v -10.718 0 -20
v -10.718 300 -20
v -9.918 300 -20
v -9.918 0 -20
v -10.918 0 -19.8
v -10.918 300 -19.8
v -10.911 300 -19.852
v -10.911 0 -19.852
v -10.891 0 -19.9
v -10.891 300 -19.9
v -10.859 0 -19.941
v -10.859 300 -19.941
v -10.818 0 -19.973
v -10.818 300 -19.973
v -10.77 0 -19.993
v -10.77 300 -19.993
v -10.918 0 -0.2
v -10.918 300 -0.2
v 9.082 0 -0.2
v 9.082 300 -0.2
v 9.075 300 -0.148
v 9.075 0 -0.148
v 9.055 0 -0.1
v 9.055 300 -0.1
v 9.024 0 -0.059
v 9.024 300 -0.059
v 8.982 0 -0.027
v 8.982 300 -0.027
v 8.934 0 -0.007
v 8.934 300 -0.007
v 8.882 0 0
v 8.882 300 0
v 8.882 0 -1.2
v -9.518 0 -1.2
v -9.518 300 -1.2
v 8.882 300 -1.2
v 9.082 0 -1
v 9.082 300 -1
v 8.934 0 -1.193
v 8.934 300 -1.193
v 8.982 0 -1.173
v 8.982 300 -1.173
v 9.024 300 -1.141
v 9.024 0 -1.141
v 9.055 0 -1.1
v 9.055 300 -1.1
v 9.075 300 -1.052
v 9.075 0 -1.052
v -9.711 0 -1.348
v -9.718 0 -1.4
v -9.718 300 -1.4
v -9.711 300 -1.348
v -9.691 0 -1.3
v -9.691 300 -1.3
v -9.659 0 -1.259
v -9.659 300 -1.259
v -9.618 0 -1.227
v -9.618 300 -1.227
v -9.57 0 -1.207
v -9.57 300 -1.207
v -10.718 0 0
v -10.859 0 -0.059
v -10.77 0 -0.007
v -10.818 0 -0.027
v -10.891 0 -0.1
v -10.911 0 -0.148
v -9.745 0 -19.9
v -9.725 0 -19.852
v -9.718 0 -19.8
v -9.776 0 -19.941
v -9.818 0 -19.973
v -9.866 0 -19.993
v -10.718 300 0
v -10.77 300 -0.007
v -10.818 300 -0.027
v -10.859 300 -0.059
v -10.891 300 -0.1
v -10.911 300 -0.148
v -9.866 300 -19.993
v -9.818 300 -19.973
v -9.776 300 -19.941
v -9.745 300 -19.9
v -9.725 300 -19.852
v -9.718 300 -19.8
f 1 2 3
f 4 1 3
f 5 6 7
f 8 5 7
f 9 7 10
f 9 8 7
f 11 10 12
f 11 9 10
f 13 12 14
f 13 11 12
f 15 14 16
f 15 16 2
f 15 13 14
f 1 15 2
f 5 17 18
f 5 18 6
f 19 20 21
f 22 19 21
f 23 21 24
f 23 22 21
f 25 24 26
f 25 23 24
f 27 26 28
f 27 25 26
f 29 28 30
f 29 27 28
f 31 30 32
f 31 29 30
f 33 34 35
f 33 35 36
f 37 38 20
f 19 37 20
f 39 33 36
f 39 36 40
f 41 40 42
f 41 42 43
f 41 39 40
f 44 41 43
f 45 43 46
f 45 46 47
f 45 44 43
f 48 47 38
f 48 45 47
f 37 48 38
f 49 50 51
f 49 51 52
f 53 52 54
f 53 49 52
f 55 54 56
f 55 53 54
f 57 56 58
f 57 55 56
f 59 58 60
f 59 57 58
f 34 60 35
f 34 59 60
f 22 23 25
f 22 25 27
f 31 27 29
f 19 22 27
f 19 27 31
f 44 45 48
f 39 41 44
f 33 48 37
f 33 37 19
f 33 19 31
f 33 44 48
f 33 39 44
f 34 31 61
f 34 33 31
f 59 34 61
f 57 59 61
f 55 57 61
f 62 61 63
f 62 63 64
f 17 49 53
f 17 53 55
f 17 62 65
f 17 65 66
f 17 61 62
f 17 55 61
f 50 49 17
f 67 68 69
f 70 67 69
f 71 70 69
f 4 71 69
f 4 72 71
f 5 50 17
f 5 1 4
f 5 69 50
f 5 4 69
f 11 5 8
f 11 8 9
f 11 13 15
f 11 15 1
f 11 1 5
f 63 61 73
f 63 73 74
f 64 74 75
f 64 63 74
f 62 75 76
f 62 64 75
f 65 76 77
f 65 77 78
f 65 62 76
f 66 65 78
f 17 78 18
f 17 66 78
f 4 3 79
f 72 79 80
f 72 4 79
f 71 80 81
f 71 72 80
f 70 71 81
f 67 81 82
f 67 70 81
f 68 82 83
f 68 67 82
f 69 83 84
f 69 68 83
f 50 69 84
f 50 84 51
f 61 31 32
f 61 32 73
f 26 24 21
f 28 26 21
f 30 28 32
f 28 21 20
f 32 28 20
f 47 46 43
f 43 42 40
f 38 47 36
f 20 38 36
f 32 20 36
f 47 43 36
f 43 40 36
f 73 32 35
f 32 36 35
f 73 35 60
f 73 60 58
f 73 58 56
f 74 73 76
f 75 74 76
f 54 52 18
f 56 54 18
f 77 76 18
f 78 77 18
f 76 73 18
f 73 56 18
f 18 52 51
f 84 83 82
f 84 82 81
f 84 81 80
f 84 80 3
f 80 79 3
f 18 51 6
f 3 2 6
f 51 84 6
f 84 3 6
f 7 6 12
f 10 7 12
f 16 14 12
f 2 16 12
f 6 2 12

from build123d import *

# Parameters (mm, degrees)
EXTRUDE_1_DEPTH = 300


with BuildPart() as part:
    # уголок-20х20 → Бобышка-Вытянуть1 (new body)
    with BuildSketch(Plane(origin=(0, 0, 0), x_dir=(1, 0, 0), z_dir=(0, 1, 0))):
        with BuildLine():
            Line((-10.917874396, 0.2), (-10.917874396, 19.8))
            ThreePointArc((-10.917874396, 19.8), (-10.859295752, 19.941421356), (-10.717874396, 20))
            Line((-10.717874396, 20), (-9.917874396, 20))
            ThreePointArc((-9.917874396, 20), (-9.77645304, 19.941421356), (-9.717874396, 19.8))
            Line((-9.717874396, 19.8), (-9.717874396, 1.4))
            ThreePointArc((-9.717874396, 1.4), (-9.659295752, 1.258578644), (-9.517874396, 1.2))
            Line((-9.517874396, 1.2), (8.882125604, 1.2))
            ThreePointArc((8.882125604, 1.2), (9.02354696, 1.141421356), (9.082125604, 1))
            Line((9.082125604, 1), (9.082125604, 0.2))
            ThreePointArc((9.082125604, 0.2), (9.02354696, 0.058578644), (8.882125604, 0))
            Line((8.882125604, 0), (-10.717874396, 0))
            ThreePointArc((-10.717874396, 0), (-10.859295752, 0.058578644), (-10.917874396, 0.2))
        make_face()
    extrude(amount=EXTRUDE_1_DEPTH)


solid = part.part
